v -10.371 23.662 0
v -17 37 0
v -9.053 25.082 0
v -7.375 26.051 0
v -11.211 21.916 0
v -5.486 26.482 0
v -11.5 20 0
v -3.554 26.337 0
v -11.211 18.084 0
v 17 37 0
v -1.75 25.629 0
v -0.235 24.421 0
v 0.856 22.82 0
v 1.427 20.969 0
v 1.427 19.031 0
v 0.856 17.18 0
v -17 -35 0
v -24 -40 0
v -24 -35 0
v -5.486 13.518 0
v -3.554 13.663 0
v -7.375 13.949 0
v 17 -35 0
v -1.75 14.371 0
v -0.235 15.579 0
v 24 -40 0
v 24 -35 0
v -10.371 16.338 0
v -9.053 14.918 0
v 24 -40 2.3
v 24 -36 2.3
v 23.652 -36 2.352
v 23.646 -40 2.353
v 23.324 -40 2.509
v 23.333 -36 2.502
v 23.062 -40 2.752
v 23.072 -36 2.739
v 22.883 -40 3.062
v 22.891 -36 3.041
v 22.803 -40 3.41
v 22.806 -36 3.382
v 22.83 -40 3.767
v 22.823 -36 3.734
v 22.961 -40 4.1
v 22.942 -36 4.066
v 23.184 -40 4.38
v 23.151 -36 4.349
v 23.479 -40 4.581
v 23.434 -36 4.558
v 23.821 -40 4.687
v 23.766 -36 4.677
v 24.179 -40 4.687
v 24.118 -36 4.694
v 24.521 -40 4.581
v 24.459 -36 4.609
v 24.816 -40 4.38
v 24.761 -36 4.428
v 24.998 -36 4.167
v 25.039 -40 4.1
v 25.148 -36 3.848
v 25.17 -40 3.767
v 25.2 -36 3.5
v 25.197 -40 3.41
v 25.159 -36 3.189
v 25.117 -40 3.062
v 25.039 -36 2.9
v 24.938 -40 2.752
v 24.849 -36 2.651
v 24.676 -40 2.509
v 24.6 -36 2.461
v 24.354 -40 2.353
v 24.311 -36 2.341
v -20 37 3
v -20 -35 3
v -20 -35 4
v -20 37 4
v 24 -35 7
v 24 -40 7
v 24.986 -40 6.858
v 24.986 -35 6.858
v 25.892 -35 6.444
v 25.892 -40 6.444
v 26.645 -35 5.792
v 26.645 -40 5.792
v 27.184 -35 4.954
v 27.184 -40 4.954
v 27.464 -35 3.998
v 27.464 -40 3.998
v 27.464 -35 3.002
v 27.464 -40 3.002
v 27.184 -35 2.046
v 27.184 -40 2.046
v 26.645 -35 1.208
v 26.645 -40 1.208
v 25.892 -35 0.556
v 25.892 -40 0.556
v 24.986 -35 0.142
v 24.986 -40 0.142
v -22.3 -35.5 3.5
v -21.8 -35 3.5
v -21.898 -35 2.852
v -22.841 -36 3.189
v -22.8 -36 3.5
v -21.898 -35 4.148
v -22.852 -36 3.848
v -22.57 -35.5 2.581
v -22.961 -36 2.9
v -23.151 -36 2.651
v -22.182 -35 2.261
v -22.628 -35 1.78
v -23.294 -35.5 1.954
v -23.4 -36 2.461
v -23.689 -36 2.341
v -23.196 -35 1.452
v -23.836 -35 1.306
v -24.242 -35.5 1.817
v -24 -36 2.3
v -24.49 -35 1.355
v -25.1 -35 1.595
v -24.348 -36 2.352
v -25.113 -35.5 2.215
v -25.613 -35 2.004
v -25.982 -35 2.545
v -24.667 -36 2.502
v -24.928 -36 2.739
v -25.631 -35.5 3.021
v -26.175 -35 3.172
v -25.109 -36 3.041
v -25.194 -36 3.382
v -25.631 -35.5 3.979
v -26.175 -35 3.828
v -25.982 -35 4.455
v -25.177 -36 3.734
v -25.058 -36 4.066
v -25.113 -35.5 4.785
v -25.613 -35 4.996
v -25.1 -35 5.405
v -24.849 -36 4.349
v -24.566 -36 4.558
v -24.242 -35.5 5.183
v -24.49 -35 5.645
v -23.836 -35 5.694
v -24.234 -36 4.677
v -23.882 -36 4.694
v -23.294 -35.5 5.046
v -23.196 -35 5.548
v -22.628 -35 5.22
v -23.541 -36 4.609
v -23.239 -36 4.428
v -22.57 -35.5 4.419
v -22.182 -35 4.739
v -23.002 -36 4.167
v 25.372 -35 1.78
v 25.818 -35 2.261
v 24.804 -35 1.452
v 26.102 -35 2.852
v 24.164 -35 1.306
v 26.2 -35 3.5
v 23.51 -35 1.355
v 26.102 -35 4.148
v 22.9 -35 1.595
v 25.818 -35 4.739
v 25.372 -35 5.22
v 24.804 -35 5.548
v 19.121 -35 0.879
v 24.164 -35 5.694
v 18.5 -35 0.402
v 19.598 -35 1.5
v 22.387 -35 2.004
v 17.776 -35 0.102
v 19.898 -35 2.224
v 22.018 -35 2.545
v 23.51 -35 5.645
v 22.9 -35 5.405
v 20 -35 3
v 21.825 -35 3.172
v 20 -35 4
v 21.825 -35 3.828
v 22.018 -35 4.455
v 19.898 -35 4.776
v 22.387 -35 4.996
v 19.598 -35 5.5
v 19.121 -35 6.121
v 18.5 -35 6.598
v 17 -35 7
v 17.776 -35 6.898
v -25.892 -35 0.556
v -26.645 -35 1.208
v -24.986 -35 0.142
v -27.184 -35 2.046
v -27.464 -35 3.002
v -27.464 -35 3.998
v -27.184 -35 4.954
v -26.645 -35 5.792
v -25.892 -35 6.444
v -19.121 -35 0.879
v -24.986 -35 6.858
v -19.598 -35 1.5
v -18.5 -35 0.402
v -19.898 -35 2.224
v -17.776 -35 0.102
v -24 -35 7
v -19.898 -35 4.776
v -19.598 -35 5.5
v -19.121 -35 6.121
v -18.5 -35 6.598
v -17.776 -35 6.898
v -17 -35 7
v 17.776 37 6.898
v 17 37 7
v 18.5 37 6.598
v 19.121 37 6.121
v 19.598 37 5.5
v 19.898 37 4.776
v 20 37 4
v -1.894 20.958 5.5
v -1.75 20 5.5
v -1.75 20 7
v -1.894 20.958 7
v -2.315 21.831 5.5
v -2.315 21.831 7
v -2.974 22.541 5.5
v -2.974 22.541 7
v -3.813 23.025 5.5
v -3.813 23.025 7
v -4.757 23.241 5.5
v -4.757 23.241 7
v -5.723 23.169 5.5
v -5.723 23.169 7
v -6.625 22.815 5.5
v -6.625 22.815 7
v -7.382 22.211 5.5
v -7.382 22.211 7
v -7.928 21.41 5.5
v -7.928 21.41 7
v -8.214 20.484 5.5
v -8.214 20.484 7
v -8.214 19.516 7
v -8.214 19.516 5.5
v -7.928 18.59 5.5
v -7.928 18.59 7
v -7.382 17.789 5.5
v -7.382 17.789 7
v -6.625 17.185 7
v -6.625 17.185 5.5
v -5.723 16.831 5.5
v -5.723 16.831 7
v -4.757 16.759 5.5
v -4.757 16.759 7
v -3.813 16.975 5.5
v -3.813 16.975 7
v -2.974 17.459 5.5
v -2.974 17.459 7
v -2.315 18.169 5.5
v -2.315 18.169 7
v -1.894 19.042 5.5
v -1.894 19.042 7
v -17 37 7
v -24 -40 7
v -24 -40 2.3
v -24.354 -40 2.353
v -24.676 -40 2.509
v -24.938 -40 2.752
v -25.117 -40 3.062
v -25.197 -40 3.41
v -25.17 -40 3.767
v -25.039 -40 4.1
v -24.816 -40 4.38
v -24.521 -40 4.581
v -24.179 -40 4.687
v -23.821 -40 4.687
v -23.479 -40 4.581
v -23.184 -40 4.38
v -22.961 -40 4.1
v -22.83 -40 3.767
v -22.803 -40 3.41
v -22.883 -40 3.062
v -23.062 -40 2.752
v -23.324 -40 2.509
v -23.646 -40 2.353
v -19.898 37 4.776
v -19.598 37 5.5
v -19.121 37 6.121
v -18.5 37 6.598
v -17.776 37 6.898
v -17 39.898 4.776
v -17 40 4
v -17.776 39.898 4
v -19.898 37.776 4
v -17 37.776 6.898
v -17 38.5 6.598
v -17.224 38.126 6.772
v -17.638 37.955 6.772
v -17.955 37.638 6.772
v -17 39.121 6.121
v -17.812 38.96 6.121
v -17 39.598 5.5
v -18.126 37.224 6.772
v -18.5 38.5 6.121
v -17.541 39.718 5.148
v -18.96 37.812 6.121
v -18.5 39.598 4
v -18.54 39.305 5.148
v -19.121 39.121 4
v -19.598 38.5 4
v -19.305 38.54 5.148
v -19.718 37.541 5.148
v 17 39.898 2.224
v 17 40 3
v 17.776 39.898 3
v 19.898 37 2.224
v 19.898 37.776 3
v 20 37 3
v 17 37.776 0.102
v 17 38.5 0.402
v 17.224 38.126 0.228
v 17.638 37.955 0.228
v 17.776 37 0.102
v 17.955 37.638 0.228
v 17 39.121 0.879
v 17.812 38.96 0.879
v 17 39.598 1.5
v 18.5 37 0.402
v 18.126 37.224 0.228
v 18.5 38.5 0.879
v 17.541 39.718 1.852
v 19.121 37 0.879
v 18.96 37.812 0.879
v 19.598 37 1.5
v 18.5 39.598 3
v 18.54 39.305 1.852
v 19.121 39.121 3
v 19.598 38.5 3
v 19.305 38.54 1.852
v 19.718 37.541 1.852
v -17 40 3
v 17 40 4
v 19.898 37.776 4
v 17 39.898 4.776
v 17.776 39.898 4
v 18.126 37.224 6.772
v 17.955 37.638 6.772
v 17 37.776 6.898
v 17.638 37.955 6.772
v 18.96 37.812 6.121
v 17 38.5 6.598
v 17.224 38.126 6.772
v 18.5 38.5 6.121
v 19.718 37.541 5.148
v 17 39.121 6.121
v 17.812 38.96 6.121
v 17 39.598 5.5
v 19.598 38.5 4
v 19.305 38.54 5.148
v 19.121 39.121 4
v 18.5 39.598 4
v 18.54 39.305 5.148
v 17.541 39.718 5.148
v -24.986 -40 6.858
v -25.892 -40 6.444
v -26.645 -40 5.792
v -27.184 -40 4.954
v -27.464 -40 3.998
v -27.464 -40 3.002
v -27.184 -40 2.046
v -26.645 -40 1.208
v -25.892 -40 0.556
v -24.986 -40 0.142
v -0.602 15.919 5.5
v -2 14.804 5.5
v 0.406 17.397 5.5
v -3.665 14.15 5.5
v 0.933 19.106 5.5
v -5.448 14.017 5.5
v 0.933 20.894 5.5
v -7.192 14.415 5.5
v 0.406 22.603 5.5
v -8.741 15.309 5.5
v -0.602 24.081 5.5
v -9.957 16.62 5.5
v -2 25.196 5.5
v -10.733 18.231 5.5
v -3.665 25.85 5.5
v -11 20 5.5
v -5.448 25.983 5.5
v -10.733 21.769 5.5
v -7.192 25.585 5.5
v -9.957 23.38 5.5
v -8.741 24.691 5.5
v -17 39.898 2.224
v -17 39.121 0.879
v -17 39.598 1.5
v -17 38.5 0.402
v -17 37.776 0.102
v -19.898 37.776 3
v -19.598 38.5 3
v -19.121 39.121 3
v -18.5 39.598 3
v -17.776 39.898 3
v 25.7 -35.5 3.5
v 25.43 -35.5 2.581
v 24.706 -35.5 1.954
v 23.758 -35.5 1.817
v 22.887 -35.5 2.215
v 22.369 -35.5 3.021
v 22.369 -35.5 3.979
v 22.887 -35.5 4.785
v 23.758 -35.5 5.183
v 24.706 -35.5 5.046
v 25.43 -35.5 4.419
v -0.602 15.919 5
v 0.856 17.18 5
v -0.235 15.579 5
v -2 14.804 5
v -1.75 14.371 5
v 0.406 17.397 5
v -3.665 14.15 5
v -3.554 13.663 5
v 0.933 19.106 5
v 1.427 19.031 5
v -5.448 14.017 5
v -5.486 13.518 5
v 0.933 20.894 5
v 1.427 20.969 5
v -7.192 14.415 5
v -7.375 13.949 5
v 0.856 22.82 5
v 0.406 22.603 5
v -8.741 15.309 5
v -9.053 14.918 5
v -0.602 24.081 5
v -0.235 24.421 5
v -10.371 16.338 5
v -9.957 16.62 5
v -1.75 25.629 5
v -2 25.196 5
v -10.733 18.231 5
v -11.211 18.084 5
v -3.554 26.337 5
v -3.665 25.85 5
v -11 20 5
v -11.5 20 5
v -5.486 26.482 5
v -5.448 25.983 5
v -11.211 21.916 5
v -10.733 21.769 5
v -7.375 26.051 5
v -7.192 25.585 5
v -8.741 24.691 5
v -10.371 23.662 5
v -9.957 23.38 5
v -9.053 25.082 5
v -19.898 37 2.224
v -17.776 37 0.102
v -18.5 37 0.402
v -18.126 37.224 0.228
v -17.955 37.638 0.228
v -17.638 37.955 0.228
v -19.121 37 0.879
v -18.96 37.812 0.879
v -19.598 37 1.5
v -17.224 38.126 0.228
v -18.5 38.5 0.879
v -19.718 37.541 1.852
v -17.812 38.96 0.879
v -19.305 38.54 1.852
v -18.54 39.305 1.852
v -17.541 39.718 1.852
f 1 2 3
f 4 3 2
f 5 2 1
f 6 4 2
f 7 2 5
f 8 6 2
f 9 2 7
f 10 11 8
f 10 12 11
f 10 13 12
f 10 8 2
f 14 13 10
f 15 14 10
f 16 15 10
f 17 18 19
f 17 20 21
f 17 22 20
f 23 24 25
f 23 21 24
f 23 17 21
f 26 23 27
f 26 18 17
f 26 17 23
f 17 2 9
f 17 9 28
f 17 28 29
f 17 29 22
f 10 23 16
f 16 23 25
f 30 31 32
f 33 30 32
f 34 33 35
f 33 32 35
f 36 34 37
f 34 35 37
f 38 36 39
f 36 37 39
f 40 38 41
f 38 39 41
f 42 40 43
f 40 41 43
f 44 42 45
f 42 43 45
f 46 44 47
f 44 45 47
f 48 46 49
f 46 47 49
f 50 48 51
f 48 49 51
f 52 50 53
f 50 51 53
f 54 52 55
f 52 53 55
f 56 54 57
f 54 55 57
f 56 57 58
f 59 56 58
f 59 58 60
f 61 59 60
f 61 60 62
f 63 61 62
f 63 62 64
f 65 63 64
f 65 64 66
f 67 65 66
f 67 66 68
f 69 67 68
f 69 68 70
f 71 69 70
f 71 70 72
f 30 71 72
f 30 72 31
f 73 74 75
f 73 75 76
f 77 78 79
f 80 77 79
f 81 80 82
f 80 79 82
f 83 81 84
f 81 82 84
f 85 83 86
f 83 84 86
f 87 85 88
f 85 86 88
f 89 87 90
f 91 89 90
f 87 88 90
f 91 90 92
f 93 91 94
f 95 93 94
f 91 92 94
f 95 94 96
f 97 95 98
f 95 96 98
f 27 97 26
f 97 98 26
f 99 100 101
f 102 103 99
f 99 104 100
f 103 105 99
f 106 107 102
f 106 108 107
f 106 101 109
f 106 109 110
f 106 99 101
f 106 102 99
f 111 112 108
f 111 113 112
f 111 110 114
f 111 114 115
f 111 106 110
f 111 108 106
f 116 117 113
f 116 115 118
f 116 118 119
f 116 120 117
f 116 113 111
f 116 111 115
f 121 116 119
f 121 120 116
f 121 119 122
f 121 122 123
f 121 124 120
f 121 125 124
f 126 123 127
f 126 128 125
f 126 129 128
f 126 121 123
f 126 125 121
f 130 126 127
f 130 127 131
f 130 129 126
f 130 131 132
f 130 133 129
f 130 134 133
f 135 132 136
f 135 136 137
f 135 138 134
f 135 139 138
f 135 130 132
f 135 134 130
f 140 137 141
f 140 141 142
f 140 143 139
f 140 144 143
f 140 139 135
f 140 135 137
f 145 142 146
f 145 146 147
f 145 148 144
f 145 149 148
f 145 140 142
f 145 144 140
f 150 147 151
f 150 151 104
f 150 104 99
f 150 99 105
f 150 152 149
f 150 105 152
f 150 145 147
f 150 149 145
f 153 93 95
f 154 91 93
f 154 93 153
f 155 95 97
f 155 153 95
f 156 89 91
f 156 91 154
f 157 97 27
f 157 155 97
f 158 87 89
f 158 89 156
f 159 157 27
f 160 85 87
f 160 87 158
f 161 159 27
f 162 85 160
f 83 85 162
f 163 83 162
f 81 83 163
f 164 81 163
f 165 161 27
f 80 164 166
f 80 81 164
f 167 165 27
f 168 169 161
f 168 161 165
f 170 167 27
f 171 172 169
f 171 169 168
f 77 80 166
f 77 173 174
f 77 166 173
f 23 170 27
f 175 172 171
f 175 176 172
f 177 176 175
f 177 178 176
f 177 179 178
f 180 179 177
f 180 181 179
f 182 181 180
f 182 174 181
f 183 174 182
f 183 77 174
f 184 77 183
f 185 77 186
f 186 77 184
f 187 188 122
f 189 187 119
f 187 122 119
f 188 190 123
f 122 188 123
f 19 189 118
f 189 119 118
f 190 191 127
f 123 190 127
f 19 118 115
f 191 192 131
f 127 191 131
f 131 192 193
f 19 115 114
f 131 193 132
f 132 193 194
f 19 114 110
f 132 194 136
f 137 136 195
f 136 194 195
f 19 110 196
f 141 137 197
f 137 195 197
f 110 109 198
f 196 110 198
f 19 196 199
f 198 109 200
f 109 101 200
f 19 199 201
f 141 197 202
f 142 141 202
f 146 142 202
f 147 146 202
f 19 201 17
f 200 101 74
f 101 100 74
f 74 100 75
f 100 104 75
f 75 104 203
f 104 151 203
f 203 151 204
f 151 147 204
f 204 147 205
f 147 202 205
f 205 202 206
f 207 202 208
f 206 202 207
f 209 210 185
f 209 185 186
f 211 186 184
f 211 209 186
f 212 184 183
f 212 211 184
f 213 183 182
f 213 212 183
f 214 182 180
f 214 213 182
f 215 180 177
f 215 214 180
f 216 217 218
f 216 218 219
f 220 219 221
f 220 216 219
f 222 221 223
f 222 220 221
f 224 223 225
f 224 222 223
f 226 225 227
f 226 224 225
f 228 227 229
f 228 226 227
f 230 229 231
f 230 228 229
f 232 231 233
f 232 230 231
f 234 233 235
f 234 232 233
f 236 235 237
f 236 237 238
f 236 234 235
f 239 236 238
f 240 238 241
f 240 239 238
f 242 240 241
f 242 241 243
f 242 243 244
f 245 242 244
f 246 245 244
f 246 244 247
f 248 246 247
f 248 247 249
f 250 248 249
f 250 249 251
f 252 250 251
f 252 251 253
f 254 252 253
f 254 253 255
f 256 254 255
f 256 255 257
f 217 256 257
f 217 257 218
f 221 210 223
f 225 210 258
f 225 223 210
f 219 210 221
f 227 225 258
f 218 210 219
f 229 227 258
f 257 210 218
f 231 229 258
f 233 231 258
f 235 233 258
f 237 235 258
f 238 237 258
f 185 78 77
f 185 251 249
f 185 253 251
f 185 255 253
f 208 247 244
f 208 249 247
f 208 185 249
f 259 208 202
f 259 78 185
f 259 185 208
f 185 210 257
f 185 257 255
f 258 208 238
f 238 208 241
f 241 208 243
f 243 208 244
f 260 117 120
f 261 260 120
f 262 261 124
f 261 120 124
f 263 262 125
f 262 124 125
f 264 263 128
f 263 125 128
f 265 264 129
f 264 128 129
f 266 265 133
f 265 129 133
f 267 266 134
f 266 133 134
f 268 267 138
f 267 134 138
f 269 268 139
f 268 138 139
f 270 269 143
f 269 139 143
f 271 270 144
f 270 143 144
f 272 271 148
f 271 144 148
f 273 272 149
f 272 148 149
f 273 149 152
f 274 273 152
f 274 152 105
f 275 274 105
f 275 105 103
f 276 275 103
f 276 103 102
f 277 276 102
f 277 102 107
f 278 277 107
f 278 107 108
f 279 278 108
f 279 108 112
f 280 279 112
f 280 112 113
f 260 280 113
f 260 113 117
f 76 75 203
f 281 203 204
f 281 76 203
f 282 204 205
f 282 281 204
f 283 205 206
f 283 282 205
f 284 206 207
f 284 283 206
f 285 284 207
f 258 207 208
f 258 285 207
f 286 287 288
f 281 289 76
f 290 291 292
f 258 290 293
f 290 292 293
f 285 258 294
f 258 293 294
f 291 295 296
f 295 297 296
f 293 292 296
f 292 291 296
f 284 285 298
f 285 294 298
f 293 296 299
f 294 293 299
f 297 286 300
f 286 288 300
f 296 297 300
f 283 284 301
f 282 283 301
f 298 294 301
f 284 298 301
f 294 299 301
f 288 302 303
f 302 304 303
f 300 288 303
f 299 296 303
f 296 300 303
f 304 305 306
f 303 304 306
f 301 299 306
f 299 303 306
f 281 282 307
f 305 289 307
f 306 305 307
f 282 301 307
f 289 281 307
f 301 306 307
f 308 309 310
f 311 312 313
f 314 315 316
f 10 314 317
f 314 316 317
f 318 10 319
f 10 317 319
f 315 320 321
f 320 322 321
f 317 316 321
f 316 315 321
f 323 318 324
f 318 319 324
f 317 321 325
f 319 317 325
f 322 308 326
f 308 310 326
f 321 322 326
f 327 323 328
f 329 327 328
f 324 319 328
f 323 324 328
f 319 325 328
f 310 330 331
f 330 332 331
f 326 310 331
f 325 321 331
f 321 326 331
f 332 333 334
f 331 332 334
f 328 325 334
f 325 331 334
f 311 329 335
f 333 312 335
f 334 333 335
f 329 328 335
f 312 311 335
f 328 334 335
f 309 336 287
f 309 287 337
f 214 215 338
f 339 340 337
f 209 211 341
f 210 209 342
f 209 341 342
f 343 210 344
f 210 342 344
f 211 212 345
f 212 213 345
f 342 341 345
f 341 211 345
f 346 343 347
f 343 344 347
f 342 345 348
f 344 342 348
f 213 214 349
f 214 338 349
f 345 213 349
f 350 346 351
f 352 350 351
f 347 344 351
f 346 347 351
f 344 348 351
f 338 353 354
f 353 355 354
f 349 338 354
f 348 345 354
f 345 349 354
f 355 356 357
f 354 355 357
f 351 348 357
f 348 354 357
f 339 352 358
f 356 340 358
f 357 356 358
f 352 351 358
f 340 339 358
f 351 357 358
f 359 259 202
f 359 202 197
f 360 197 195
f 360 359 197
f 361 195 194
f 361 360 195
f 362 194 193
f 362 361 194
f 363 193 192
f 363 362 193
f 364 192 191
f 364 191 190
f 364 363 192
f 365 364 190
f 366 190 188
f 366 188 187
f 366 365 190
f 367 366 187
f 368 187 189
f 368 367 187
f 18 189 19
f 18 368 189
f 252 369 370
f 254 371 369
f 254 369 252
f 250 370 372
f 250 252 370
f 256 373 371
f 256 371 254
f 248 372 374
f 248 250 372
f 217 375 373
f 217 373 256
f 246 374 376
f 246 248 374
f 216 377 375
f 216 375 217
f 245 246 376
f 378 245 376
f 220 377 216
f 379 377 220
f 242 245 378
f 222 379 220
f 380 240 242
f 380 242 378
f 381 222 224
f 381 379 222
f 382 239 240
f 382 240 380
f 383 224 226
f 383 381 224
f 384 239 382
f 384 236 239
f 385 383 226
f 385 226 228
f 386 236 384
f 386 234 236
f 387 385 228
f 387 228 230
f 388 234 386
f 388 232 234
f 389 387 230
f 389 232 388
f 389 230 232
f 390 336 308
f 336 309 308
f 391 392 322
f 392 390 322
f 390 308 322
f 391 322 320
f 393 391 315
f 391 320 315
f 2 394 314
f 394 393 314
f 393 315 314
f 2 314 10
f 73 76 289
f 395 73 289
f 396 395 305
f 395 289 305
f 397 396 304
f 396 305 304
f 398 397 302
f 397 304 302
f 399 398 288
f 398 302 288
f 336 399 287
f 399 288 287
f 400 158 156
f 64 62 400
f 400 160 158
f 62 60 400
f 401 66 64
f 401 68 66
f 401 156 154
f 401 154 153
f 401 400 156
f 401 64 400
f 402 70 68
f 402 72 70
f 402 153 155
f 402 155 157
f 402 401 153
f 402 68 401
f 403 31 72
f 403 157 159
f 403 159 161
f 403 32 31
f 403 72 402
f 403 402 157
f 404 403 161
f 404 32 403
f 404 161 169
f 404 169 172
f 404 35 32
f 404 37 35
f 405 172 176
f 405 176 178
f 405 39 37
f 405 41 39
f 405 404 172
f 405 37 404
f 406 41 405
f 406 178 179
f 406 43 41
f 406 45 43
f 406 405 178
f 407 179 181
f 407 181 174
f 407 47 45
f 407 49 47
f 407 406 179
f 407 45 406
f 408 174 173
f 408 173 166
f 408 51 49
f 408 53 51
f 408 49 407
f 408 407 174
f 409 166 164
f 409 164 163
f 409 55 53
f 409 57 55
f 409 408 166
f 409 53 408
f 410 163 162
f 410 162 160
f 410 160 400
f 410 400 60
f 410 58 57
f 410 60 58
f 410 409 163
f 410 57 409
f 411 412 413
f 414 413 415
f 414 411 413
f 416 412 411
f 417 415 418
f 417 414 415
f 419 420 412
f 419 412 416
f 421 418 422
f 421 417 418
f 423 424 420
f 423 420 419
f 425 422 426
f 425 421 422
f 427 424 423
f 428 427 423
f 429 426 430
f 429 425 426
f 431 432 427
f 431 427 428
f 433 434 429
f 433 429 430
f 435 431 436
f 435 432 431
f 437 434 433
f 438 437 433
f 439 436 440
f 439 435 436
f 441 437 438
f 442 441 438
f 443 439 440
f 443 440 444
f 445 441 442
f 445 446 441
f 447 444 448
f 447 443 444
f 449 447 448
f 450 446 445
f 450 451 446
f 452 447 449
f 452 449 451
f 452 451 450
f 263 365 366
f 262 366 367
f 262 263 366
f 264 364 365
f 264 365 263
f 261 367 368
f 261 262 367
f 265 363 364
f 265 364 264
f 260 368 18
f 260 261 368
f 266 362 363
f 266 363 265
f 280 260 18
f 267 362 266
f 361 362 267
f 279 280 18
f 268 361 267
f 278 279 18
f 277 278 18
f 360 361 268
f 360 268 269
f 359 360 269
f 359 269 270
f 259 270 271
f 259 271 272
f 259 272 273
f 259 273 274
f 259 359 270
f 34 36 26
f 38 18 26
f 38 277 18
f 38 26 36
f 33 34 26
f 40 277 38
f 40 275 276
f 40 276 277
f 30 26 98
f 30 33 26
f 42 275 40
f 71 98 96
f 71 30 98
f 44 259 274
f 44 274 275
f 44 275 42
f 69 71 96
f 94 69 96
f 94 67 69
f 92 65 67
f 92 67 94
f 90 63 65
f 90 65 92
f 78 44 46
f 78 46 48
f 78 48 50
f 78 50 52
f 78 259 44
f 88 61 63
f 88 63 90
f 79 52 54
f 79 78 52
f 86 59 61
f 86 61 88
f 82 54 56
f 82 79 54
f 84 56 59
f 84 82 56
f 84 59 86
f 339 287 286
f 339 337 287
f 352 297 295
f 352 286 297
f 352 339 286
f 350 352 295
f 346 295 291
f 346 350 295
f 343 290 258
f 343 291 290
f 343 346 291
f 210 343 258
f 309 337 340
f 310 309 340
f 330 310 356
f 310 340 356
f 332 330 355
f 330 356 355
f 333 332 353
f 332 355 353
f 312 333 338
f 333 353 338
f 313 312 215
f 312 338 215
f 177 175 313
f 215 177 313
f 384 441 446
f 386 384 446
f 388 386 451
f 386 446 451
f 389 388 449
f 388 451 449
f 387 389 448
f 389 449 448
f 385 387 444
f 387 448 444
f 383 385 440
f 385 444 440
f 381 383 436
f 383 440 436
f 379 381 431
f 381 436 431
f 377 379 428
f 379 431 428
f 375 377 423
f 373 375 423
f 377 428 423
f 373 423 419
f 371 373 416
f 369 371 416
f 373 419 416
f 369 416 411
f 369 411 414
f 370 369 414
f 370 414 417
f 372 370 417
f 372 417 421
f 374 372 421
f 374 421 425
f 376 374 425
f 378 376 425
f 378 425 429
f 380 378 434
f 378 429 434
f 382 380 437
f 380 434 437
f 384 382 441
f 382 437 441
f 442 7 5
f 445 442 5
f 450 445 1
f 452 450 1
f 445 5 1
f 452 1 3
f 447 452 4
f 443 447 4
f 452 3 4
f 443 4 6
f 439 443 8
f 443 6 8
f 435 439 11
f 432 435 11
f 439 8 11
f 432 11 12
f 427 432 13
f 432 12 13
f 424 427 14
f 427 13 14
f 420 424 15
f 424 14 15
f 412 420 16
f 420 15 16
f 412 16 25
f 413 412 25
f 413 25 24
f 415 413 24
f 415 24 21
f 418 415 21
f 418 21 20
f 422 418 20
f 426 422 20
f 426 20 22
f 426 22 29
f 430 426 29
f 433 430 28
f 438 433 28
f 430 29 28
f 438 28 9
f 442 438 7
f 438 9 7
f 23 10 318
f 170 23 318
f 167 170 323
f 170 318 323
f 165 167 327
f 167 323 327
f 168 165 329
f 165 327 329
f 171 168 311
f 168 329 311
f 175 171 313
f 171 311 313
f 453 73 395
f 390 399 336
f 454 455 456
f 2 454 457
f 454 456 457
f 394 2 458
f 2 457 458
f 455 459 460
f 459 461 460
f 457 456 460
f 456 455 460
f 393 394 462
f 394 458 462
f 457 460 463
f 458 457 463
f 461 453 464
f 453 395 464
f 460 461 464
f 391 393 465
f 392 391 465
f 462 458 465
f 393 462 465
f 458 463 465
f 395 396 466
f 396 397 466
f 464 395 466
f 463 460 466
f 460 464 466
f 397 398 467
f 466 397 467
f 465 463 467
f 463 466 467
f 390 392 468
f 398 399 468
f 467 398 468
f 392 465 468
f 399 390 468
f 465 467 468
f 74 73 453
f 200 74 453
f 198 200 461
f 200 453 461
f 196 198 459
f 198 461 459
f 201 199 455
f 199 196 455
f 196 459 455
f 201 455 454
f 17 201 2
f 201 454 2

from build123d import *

# Parameters (mm, degrees)
CROQUIS1_W                   = 40
CROQUIS1_H                   = 80
CROQUIS1_R                   = 3.25
SALIENTE_EXTRUIR1_DEPTH      = 7
CROQUIS2_R                   = 6.5
CORTAR_EXTRUIR1_DEPTH        = 5
CROQUIS3_R                   = 6
CORTAR_EXTRUIR2_DEPTH        = 0.5
REDONDEO2_R                  = 3
SALIENTE_EXTRUIR2_DEPTH      = 5
TALADROAVANZADO1_OUTLINE_R   = 1.2
TALADROAVANZADO1_DEPTH       = 1
TALADROAVANZADO1_DRAFT       = -45
TALADROAVANZADO1_2_OUTLINE_R = 1.2
TALADROAVANZADO1_2_DEPTH     = 1
TALADROAVANZADO1_2_DRAFT     = -45
CORTAR_EXTRUIR3_START        = 1
CROQUIS8_R                   = 1.2
CORTAR_EXTRUIR3_DEPTH        = 83.124903698


# Read off the part's stored shape, not the designer's step: TaladroAvanzado1
with BuildPart() as part:
    # Croquis1 → Saliente-Extruir1 (new body)
    with BuildSketch(Plane.XY):
        Rectangle(CROQUIS1_W, CROQUIS1_H)
        with Locations((-5, 20)):
            Circle(CROQUIS1_R, mode=Mode.SUBTRACT)
    extrude(amount=SALIENTE_EXTRUIR1_DEPTH)

    # Croquis2 → Cortar-Extruir1 (cut)
    with BuildSketch(Plane(origin=(0, 0, 0), x_dir=(-1, 0, 0), z_dir=(0, 0, -1))):
        with Locations((5, 20)):
            Circle(CROQUIS2_R)
    extrude(amount=-CORTAR_EXTRUIR1_DEPTH, mode=Mode.SUBTRACT)

    # Croquis3 → Cortar-Extruir2 (cut)
    with BuildSketch(Plane(origin=(0, 0, 5), x_dir=(-1, 0, 0), z_dir=(0, 0, -1))):
        with Locations((5, 20)):
            Circle(CROQUIS3_R)
    extrude(amount=-CORTAR_EXTRUIR2_DEPTH, mode=Mode.SUBTRACT)

    # Redondeo2
    redondeo2_edges = [part.edges().sort_by_distance(p)[0] for p in [
        (-20, 40, 3.5),
        (20, 40, 3.5),
        (20, 0, 7),
        (0, 40, 7),
        (-20, 0, 7),
        (-20, 0, 0),
        (0, 40, 0),
        (20, 0, 0),
    ]]
    fillet(redondeo2_edges, radius=REDONDEO2_R)

    # Croquis4 → Saliente-Extruir2 (add)
    with BuildSketch(Plane.XZ.offset(40)):
        with BuildLine():
            Line((-17, 7), (-24, 7))
            ThreePointArc((-24, 7), (-27.5, 3.5), (-24, 0))
            Line((-24, 0), (-17, 0))
            Line((-17, 0), (-17, 7))
        make_face()
        with BuildLine():
            Line((17, 7), (24, 7))
            ThreePointArc((24, 7), (27.5, 3.5), (24, 0))
            Line((24, 0), (17, 0))
            Line((17, 0), (17, 7))
        make_face()
    extrude(amount=-SALIENTE_EXTRUIR2_DEPTH)


with BuildPart() as taladroavanzado1_tool:
    # TaladroAvanzado1 outline → TaladroAvanzado1 (with draft: the straight prism first)
    with BuildSketch(Plane(origin=(0, -36, 0), x_dir=(1, 0, 0), z_dir=(0, 1, 0))):
        with Locations((24, -3.5)):
            Circle(TALADROAVANZADO1_OUTLINE_R)
    extrude(amount=TALADROAVANZADO1_DEPTH)
    # TaladroAvanzado1: the draft: its side faces are tilted about the plane it starts from
    taladroavanzado1_sides = [taladroavanzado1_tool.faces().sort_by_distance(p)[0] for p in [
        (22.8, -35.5, 3.5),
    ]]
    draft(taladroavanzado1_sides, Plane(origin=(0, -36, 0), x_dir=(1, 0, 0), z_dir=(0, 1, 0)), TALADROAVANZADO1_DRAFT)


with BuildPart() as part_1:
    add(part.part)

    # TaladroAvanzado1: cut by taladroavanzado1_tool
    add(taladroavanzado1_tool.part, mode=Mode.SUBTRACT)


with BuildPart() as taladroavanzado1_2_tool:
    # TaladroAvanzado1 2 outline → TaladroAvanzado1 2 (with draft: the straight prism first)
    with BuildSketch(Plane(origin=(0, -36, 0), x_dir=(1, 0, 0), z_dir=(0, 1, 0))):
        with Locations((-24, -3.5)):
            Circle(TALADROAVANZADO1_2_OUTLINE_R)
    extrude(amount=TALADROAVANZADO1_2_DEPTH)
    # TaladroAvanzado1 2: the draft: its side faces are tilted about the plane it starts from
    taladroavanzado1_2_sides = [taladroavanzado1_2_tool.faces().sort_by_distance(p)[0] for p in [
        (-25.2, -35.5, 3.5),
    ]]
    draft(taladroavanzado1_2_sides, Plane(origin=(0, -36, 0), x_dir=(1, 0, 0), z_dir=(0, 1, 0)), TALADROAVANZADO1_2_DRAFT)


with BuildPart() as part_2:
    add(part_1.part)

    # TaladroAvanzado1 2: cut by taladroavanzado1_2_tool
    add(taladroavanzado1_2_tool.part, mode=Mode.SUBTRACT)

    # Croquis8 → Cortar-Extruir3 (cut, through all)
    with BuildSketch(Plane(origin=(0, -36, 0), x_dir=(1, 0, 0), z_dir=(0, 1, 0)).offset(CORTAR_EXTRUIR3_START)):
        with Locations(Location((24, -3.5, 0), (0, 0, 90))):
            Circle(CROQUIS8_R)
        with Locations(Location((-24, -3.5, 0), (0, 0, 90))):
            Circle(CROQUIS8_R)
    extrude(amount=-CORTAR_EXTRUIR3_DEPTH, mode=Mode.SUBTRACT)


solid = part_2.part
